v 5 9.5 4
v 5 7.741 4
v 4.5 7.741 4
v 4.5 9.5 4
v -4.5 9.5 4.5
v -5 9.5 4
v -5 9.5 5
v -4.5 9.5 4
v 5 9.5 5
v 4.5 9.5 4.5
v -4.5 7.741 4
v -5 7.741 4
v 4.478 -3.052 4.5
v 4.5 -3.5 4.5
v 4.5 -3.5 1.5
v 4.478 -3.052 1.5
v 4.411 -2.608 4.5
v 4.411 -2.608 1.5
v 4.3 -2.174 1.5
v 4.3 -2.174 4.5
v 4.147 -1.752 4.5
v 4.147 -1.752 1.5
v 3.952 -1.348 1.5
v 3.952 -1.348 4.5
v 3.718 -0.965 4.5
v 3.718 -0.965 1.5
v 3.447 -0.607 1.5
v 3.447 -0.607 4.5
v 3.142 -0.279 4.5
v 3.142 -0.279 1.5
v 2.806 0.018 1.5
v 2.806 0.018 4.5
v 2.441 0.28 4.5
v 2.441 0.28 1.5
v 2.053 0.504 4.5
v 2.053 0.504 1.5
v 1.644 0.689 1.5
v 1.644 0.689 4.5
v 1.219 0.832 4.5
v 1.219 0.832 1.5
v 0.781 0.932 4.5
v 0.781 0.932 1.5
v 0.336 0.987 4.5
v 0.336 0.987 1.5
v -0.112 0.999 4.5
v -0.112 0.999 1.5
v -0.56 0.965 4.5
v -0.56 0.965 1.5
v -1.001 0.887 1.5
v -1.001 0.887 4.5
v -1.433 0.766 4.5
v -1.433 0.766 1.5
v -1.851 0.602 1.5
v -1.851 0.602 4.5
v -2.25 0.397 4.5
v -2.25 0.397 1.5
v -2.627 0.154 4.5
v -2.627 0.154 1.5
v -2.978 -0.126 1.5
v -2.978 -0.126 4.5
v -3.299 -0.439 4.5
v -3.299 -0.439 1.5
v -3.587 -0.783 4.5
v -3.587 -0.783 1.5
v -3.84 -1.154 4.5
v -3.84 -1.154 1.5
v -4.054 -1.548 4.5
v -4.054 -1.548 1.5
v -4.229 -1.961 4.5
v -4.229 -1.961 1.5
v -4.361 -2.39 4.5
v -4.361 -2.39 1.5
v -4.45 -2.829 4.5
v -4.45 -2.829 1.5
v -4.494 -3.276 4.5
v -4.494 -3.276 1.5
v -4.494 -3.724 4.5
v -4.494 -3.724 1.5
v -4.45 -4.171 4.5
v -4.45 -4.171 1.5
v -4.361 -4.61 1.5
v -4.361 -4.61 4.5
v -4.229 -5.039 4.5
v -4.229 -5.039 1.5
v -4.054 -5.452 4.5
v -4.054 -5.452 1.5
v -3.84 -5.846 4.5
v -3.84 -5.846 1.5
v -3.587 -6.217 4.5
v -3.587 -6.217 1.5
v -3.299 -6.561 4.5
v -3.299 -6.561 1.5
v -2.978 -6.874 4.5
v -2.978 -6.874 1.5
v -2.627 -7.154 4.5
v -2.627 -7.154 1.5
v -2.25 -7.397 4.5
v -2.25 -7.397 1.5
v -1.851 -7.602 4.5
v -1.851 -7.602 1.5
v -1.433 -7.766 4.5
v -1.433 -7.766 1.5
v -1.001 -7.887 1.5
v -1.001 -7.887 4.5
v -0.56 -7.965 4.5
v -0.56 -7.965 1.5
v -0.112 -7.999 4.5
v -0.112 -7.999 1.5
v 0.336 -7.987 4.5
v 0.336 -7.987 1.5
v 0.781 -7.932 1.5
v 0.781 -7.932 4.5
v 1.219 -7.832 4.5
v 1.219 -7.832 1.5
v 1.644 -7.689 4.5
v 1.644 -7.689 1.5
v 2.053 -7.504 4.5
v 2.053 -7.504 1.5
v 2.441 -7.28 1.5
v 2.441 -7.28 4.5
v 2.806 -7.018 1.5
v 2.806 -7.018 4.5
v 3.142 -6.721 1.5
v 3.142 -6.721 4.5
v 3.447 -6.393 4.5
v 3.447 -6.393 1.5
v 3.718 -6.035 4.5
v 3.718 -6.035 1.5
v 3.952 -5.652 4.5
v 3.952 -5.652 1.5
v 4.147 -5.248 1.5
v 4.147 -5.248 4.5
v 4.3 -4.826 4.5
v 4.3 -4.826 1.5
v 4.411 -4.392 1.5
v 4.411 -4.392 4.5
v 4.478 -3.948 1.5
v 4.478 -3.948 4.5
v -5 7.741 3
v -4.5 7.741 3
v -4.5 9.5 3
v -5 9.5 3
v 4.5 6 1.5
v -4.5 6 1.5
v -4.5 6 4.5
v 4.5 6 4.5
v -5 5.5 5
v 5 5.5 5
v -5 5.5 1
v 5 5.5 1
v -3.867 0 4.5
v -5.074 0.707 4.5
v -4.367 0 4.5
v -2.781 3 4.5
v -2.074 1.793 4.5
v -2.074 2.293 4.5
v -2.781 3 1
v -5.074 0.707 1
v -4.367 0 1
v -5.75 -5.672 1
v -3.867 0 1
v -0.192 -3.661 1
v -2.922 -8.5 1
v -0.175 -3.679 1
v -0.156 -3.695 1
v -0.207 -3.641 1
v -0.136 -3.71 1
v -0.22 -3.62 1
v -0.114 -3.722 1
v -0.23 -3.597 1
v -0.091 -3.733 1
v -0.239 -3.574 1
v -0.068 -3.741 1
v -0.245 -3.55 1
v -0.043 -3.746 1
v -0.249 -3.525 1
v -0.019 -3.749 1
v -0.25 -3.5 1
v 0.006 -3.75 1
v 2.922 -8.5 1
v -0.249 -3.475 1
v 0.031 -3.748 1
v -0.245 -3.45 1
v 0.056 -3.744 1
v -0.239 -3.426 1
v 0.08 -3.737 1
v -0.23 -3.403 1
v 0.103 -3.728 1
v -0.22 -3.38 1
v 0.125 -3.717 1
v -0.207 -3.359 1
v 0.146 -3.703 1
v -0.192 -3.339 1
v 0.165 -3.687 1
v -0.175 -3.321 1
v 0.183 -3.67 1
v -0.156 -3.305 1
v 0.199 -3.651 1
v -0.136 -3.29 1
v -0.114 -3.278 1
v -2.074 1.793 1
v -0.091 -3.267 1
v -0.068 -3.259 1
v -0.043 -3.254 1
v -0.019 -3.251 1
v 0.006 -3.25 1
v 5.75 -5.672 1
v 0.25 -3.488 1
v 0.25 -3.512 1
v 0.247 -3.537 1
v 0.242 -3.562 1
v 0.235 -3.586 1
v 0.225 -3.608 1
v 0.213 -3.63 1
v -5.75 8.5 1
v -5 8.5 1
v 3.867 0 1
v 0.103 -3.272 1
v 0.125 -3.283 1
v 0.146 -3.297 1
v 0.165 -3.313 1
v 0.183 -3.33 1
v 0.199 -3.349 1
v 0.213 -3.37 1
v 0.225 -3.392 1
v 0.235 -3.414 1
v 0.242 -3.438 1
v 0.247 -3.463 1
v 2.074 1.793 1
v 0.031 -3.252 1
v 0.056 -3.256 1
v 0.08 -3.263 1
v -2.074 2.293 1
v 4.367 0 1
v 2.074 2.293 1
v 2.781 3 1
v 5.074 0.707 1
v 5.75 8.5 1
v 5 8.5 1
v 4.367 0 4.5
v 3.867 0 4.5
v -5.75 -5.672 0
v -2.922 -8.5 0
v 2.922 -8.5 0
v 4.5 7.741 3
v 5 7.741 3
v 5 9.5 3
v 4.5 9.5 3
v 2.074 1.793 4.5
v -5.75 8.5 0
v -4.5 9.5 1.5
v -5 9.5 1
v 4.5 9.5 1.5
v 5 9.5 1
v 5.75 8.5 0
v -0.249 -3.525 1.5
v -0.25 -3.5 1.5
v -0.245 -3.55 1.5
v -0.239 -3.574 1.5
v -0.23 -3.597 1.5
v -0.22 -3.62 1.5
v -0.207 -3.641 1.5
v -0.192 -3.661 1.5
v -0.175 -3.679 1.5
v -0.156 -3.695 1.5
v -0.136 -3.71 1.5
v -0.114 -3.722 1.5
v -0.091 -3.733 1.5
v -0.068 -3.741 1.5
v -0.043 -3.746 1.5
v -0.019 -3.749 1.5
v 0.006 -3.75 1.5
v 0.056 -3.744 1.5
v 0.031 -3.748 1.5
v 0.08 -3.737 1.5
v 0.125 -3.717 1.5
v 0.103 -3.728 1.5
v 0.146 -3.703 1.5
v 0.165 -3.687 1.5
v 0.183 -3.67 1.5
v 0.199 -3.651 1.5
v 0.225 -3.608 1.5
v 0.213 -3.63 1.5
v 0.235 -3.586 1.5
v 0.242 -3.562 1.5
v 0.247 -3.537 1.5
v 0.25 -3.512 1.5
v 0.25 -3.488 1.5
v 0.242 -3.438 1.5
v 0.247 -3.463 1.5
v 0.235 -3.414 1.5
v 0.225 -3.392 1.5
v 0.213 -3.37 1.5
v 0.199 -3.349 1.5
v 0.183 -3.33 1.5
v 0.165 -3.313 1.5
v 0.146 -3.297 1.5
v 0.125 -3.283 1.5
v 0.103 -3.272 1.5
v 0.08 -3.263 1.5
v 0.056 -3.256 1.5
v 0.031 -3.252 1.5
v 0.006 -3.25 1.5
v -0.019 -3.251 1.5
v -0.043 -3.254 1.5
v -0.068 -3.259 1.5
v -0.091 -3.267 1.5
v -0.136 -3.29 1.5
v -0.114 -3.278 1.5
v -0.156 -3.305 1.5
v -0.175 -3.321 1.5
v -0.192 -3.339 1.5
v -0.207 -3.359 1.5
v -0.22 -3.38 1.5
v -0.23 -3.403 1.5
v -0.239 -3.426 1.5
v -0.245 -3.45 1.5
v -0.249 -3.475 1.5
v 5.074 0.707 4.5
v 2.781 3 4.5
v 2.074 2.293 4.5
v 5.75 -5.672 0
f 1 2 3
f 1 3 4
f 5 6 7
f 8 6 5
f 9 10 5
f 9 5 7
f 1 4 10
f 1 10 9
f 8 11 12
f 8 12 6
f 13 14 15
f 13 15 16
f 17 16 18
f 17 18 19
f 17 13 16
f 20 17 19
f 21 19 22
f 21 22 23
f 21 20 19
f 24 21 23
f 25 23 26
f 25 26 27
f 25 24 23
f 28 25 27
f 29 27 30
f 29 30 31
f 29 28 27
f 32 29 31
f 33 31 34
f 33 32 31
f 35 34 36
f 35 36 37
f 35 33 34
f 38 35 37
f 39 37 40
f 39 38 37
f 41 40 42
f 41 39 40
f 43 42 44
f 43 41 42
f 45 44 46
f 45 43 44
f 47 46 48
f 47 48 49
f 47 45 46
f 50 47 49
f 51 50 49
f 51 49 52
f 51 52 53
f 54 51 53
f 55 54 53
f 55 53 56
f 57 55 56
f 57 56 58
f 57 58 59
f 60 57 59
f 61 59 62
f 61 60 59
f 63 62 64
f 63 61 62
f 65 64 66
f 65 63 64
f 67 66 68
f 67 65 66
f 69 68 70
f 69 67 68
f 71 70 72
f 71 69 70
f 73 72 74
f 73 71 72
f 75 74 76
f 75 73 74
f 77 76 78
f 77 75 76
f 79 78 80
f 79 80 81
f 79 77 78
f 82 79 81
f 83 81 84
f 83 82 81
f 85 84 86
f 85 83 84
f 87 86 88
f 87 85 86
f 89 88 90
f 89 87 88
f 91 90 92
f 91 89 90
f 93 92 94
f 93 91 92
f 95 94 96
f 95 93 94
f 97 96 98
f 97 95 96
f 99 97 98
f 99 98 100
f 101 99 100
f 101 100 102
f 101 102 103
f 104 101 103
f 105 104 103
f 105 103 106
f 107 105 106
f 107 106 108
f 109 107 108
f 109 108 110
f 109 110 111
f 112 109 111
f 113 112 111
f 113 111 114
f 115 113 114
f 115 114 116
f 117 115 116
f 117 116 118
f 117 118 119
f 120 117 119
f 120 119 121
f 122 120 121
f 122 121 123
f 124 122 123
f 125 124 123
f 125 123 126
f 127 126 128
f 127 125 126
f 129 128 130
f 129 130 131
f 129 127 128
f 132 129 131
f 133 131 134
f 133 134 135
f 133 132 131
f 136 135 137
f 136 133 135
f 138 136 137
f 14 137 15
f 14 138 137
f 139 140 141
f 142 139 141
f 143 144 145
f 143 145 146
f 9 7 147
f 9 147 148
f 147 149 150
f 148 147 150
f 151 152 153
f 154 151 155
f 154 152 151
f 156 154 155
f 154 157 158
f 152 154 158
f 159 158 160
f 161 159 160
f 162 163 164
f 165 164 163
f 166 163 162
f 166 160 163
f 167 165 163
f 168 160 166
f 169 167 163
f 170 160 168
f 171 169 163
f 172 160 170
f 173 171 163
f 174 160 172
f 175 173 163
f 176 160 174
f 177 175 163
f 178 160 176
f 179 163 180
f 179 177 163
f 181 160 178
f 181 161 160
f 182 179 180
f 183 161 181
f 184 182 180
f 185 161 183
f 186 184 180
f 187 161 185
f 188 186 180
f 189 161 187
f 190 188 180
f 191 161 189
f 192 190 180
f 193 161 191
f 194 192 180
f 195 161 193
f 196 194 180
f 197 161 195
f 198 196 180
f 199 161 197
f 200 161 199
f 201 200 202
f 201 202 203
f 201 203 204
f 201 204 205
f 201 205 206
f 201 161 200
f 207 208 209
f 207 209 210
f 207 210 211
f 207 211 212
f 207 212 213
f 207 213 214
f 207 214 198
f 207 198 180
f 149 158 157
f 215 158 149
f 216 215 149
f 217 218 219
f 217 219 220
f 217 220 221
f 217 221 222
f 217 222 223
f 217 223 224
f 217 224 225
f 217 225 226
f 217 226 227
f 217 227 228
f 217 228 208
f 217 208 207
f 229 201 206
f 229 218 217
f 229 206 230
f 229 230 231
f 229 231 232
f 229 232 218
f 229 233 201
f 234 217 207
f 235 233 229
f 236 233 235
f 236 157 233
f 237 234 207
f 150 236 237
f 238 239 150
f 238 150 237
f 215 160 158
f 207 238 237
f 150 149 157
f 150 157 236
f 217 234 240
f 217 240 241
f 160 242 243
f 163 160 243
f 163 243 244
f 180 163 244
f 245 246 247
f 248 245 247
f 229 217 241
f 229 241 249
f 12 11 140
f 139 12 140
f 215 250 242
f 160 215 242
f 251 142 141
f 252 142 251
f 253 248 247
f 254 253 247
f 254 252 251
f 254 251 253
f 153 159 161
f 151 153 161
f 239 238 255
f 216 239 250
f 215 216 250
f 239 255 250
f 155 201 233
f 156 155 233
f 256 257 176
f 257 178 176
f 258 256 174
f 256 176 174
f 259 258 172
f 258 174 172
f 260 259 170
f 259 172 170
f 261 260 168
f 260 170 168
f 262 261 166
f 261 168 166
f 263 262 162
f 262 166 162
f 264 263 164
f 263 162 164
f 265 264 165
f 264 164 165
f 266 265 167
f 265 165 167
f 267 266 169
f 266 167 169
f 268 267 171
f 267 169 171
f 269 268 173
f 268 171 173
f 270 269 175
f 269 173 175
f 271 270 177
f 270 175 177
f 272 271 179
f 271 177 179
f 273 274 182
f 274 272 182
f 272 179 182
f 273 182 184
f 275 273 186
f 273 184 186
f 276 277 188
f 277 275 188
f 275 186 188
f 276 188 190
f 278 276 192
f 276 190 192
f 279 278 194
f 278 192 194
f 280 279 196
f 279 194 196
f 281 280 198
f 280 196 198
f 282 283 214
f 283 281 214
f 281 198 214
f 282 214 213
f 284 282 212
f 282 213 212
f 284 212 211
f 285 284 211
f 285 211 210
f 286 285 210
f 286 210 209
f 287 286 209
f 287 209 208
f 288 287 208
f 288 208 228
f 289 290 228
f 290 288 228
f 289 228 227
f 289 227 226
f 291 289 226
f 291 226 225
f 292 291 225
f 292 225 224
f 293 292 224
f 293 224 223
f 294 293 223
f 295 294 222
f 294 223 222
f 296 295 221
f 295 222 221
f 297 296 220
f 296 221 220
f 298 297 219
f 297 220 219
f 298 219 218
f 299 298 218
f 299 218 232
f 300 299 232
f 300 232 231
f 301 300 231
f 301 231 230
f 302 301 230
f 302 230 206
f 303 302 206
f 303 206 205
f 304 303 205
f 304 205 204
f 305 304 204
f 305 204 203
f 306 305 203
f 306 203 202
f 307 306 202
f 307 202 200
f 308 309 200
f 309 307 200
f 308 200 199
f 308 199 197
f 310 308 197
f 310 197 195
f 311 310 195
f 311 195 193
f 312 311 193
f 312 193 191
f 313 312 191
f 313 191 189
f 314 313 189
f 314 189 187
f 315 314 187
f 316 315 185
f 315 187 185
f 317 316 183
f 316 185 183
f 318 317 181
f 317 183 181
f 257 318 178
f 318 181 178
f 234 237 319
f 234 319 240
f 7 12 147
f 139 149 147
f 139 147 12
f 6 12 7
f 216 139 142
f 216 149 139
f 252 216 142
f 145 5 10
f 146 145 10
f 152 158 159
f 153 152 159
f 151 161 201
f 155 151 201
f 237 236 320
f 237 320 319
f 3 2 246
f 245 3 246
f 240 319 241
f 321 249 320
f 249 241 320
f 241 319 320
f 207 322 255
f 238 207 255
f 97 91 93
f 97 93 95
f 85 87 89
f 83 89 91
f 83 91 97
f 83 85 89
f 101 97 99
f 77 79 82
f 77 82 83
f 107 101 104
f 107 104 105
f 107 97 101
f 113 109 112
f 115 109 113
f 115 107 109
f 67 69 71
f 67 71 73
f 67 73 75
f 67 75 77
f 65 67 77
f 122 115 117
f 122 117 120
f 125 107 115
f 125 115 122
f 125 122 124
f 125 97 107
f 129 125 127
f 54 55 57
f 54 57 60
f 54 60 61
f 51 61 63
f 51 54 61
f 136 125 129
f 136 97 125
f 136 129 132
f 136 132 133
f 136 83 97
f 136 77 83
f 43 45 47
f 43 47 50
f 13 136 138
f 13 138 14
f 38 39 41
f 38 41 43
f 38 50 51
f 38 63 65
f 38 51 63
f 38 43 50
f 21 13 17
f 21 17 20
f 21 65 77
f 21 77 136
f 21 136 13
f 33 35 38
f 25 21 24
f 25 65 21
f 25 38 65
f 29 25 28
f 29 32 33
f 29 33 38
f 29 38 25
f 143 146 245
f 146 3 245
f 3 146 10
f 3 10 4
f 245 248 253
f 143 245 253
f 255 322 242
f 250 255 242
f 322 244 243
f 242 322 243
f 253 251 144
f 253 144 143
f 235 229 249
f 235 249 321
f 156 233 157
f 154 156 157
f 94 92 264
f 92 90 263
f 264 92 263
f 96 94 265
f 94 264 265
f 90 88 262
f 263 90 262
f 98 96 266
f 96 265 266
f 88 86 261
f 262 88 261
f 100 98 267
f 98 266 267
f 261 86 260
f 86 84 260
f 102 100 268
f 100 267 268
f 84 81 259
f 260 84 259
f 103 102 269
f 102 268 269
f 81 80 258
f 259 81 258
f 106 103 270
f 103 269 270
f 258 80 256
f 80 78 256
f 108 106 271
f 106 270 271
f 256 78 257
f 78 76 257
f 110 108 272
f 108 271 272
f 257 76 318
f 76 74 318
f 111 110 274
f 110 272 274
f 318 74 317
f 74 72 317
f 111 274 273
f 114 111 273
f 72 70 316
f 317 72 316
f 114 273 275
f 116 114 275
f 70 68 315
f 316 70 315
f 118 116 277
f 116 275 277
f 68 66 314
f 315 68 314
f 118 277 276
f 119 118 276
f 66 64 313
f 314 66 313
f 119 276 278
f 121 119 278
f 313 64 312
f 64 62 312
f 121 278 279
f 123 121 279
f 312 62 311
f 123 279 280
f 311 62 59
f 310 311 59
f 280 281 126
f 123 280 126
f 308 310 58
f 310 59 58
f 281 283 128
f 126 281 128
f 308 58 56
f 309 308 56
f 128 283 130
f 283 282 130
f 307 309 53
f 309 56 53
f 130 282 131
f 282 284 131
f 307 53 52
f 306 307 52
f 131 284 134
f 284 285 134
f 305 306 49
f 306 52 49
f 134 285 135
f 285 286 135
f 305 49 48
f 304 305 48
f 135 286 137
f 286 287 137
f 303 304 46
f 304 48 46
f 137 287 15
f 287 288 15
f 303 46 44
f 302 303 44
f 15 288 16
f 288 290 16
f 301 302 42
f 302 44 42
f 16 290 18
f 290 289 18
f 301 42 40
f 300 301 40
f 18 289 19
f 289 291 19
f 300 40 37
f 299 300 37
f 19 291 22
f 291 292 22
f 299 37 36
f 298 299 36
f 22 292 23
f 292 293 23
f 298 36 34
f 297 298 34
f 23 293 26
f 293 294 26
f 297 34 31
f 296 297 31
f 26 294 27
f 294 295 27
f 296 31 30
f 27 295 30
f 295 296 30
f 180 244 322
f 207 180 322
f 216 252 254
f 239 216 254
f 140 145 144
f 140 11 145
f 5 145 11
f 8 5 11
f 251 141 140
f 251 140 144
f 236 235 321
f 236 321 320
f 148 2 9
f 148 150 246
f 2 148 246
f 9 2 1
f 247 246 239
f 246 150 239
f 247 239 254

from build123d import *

# Parameters (mm, degrees)
SALIENTE_EXTRUIR1_DEPTH = 1
SALIENTE_EXTRUIR2_DEPTH = 3.5
CROQUIS3_R              = 0.25
SALIENTE_EXTRUIR3_DEPTH = 4.5
CROQUIS4_R              = 4.5
SALIENTE_EXTRUIR4_DEPTH = 3
CROQUIS5_W              = 10
CROQUIS5_H              = 4
SALIENTE_EXTRUIR5_DEPTH = 4
CROQUIS6_W              = 9
CROQUIS6_H              = 3
CORTAR_EXTRUIR1_DEPTH   = 3.5
CROQUIS7_W              = 1
CROQUIS7_H              = 2
CORTAR_EXTRUIR2_DEPTH   = 16.192514604


with BuildPart() as part:
    # Croquis1 → Saliente-Extruir1 (new body)
    with BuildSketch(Plane.XY):
        Polygon((-5.75, -5.671572875), (-2.921572875, -8.5), (2.921572875, -8.5), (5.75, -5.671572875), (5.75, 8.5), (-5.75, 8.5), align=None)
    extrude(amount=SALIENTE_EXTRUIR1_DEPTH)

    # Croquis2 → Saliente-Extruir2 (add)
    with BuildSketch(Plane.XY.offset(1)):
        Polygon((-2.780902327, 3), (-5.073795546, 0.707106781), (-4.366688764, 0), (-3.866688764, 0), (-2.073795546, 1.792893219), (-2.073795546, 2.292893219), align=None)
        Polygon((2.073795546, 1.792893219), (2.073795546, 2.292893219), (2.780902327, 3), (5.073795546, 0.707106781), (4.366688764, 0), (3.866688764, 0), align=None)
    extrude(amount=SALIENTE_EXTRUIR2_DEPTH)

    # Croquis3 → Saliente-Extruir3 (add)
    with BuildSketch(Plane.XY):
        with Locations(Location((0, -3.5, 0), (0, 0, 180))):
            Circle(CROQUIS3_R)
    extrude(amount=SALIENTE_EXTRUIR3_DEPTH)

    # Croquis4 → Saliente-Extruir4 (add)
    with BuildSketch(Plane.XY.offset(4.5)):
        with Locations((0, -3.5)):
            Circle(CROQUIS4_R)
    extrude(amount=-SALIENTE_EXTRUIR4_DEPTH)

    # Croquis5 → Saliente-Extruir5 (add)
    with BuildSketch(Plane.XY.offset(1)):
        with Locations((0, 7.5)):
            Rectangle(CROQUIS5_W, CROQUIS5_H)
    extrude(amount=SALIENTE_EXTRUIR5_DEPTH)

    # Croquis6 → Cortar-Extruir1 (cut)
    with BuildSketch(Plane(origin=(0, 9.5, 0), x_dir=(1, 0, 0), z_dir=(0, 1, 0))):
        with Locations((0, -3)):
            Rectangle(CROQUIS6_W, CROQUIS6_H)
    extrude(amount=-CORTAR_EXTRUIR1_DEPTH, mode=Mode.SUBTRACT)

    # Croquis7 → Cortar-Extruir2 (cut, through all)
    with BuildSketch(Plane(origin=(5, 0, 0), x_dir=(0, 0, -1), z_dir=(1, 0, 0))):
        with Locations((-3.5, 8.741122999)):
            Rectangle(CROQUIS7_W, CROQUIS7_H)
    extrude(amount=-CORTAR_EXTRUIR2_DEPTH, mode=Mode.SUBTRACT)


solid = part.part
